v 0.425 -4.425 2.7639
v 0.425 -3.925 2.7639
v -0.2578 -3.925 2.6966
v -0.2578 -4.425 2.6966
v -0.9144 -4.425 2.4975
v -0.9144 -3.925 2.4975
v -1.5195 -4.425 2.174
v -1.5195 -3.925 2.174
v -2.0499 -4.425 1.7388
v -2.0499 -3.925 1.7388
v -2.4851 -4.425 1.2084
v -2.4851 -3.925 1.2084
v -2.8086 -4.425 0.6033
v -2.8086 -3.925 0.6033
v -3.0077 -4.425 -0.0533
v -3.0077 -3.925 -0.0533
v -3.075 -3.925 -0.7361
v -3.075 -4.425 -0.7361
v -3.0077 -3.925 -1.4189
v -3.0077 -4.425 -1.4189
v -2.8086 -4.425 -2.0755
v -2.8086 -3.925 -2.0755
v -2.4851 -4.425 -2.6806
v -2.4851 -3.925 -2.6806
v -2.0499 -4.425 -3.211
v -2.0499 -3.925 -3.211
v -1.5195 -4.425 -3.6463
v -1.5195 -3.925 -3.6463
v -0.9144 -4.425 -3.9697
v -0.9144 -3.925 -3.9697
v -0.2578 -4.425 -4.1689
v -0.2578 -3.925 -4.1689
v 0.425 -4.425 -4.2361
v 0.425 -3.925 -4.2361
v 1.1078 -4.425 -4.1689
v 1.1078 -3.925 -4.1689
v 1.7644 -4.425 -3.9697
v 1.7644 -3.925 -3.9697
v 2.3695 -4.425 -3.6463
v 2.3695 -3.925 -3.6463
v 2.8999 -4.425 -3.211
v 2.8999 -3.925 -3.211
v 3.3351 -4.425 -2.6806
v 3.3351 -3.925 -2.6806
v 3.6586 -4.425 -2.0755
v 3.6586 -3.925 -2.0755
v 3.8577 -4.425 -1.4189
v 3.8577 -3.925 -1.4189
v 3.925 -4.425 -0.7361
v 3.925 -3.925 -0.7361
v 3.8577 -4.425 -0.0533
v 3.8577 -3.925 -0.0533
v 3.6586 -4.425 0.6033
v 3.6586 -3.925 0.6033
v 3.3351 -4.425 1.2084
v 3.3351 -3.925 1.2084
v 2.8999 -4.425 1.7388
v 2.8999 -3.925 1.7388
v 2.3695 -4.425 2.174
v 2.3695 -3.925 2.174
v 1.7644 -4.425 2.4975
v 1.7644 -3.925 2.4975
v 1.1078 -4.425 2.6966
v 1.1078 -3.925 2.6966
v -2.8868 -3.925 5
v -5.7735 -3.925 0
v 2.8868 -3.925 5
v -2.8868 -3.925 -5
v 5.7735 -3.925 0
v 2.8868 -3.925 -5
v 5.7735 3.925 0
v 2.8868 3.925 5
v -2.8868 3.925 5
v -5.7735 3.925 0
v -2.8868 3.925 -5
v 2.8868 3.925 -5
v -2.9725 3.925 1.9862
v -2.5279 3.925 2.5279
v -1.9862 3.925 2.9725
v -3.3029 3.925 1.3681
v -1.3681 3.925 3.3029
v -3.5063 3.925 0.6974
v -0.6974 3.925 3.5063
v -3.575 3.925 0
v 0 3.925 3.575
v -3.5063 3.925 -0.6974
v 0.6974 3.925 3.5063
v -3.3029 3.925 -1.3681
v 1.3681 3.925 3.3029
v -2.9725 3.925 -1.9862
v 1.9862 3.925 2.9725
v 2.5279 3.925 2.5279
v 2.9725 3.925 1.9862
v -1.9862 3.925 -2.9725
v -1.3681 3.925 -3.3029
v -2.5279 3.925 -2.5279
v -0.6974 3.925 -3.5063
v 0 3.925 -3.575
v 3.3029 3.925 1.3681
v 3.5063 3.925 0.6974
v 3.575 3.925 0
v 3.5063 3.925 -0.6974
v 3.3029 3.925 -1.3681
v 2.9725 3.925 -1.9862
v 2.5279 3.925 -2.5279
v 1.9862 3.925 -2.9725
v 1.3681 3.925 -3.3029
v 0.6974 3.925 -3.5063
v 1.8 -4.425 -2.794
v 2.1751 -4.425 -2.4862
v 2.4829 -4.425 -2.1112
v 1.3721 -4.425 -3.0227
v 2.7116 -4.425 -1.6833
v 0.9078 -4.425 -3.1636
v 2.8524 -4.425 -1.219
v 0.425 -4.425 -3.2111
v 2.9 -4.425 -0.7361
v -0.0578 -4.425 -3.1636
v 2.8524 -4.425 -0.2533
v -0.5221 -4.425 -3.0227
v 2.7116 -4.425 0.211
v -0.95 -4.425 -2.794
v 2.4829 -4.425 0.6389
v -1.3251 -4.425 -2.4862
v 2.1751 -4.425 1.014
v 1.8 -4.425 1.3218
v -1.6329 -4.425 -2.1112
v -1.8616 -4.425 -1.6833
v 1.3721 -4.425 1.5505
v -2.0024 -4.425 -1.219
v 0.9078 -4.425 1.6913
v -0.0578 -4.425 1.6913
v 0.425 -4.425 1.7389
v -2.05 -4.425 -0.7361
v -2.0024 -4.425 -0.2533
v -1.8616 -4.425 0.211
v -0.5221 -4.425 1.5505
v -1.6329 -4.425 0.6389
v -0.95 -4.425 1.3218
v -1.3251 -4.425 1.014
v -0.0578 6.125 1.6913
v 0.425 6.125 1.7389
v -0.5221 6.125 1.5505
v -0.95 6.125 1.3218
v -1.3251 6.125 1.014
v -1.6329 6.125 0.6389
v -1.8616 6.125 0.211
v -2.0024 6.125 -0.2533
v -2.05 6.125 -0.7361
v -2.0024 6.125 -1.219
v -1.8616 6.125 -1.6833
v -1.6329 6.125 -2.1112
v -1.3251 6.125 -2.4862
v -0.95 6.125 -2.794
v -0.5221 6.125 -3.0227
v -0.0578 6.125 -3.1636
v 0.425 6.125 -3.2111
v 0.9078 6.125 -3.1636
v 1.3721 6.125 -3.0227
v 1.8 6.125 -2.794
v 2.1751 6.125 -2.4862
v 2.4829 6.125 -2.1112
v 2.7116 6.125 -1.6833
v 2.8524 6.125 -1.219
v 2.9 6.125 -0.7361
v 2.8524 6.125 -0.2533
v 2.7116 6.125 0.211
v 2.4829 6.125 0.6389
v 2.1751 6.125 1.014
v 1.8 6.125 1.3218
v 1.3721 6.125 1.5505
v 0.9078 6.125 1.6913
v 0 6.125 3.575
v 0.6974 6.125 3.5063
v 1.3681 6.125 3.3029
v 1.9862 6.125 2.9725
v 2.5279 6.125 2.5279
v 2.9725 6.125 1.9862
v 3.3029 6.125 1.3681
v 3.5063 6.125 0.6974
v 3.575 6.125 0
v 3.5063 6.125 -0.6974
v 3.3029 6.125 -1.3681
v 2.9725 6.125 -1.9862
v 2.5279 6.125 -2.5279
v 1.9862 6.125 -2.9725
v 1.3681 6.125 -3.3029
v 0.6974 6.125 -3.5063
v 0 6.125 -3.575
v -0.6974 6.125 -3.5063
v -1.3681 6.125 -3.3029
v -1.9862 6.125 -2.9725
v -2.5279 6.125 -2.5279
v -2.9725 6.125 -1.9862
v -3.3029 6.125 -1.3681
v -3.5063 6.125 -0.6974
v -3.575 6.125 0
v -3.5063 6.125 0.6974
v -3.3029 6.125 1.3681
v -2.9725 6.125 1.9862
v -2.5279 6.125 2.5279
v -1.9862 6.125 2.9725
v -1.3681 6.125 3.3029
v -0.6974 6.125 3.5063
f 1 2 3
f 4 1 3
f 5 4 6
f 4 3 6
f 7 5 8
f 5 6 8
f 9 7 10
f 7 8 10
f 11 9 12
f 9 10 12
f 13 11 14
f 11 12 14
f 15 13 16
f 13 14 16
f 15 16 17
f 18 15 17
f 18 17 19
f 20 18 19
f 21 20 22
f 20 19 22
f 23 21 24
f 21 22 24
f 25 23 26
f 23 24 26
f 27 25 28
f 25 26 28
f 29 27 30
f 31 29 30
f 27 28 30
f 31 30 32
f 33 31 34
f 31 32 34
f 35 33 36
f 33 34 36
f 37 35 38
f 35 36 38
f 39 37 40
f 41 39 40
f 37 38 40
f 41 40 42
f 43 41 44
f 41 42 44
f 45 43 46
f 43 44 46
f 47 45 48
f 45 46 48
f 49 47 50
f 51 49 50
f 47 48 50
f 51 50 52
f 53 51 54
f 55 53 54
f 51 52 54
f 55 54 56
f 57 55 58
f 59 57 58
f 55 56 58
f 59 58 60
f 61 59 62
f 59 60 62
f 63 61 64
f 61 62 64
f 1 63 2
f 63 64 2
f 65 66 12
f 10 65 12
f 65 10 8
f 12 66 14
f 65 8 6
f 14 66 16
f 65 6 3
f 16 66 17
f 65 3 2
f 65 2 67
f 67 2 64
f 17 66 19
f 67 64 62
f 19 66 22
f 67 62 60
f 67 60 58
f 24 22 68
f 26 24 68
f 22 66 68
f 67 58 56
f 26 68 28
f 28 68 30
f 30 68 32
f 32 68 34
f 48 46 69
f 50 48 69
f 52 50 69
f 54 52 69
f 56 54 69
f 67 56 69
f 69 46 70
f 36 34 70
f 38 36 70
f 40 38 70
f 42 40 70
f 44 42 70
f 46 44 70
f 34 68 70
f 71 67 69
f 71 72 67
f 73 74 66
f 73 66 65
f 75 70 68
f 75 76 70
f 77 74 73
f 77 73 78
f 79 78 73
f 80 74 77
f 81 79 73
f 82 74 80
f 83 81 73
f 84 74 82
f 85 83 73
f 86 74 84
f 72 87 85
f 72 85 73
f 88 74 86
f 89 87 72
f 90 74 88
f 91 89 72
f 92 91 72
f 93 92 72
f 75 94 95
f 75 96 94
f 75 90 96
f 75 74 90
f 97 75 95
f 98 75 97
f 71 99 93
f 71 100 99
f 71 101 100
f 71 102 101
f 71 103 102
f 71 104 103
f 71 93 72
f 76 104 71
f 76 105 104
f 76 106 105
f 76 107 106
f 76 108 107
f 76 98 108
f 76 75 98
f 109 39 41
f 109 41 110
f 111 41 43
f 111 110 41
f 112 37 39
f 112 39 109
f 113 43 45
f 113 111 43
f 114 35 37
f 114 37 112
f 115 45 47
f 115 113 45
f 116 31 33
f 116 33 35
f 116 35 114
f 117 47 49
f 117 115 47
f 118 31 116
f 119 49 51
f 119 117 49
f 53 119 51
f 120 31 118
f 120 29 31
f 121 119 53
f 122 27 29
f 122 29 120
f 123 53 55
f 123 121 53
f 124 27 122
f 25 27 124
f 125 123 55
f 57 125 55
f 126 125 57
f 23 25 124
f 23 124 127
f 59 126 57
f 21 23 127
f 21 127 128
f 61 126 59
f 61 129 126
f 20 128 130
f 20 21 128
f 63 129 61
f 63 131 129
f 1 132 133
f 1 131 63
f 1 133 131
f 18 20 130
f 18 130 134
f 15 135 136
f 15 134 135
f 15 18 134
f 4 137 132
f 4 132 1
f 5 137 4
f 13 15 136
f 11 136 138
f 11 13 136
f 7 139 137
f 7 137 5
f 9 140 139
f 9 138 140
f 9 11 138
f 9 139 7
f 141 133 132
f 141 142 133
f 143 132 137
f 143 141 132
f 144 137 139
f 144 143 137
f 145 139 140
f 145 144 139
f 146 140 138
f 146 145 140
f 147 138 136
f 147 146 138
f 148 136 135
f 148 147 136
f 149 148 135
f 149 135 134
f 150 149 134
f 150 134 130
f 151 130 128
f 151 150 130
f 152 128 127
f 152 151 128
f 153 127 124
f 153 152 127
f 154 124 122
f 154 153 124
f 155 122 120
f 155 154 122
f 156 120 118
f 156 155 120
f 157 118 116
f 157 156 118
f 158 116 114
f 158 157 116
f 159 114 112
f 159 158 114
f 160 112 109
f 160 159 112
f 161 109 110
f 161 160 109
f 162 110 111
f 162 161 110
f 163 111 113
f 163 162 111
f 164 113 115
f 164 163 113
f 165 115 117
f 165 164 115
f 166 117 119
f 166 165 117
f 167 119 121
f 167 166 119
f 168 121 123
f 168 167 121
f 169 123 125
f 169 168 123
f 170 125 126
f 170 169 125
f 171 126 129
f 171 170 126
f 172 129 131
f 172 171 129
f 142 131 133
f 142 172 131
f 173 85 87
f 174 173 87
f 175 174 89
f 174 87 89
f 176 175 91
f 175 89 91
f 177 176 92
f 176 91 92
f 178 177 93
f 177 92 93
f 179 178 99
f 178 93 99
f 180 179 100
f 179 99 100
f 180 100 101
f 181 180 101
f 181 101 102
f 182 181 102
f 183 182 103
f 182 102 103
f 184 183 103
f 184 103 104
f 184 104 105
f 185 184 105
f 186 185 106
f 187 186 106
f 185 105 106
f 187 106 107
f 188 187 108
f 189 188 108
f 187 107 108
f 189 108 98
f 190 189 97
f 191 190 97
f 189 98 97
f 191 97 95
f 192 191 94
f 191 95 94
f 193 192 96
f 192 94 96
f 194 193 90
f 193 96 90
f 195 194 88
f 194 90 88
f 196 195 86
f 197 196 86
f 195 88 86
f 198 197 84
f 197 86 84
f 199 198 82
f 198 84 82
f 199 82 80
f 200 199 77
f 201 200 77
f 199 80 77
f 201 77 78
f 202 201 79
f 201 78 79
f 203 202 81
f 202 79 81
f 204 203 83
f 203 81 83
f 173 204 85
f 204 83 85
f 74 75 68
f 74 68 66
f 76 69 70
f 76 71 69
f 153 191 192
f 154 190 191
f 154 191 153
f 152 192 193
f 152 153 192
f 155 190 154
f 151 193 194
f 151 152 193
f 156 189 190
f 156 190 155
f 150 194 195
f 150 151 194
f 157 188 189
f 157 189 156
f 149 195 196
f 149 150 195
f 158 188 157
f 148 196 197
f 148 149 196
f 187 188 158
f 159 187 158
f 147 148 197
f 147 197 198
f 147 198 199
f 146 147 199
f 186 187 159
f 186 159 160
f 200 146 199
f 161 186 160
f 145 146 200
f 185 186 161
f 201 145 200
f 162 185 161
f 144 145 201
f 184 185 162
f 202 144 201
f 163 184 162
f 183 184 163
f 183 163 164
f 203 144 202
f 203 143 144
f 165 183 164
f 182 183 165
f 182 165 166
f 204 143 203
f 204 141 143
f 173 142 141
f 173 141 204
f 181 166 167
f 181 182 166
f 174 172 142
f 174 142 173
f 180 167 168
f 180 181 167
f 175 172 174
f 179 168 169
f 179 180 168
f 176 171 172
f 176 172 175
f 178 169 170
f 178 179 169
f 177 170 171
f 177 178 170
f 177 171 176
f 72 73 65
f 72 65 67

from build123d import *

# Parameters (mm, degrees)
BOSS_EXTRUDE1_DEPTH = 3.925
SKETCH2_R           = 3.575
BOSS_EXTRUDE2_DEPTH = 2.2
SKETCH3_R           = 2.475
CUT_EXTRUDE1_DEPTH  = 13.622829846
SKETCH4_R           = 3.5
SKETCH4_R_2         = 2.475
BOSS_EXTRUDE3_DEPTH = 0.5


with BuildPart() as part:
    # Sketch1 → Boss-Extrude1 (new, symmetric)
    with BuildSketch(Plane(origin=(0, 0, 0), x_dir=(1, 0, 0), z_dir=(0, 1, 0))):
        Polygon((2.886751346, 5), (-2.886751346, 5), (-5.773502692, 0), (-2.886751346, -5), (2.886751346, -5), (5.773502692, 0), align=None)
    extrude(amount=BOSS_EXTRUDE1_DEPTH, both=True)

    # Sketch2 → Boss-Extrude2 (add)
    with BuildSketch(Plane(origin=(0, 3.925, 0), x_dir=(1, 0, 0), z_dir=(0, 1, 0))):
        with Locations(Location((0, 0, 0), (0, 0, 270))):
            Circle(SKETCH2_R)
    extrude(amount=BOSS_EXTRUDE2_DEPTH)

    # Sketch3 → Cut-Extrude1 (cut, through all)
    with BuildSketch(Plane(origin=(0, 6.125, 0), x_dir=(1, 0, 0), z_dir=(0, 1, 0))):
        with Locations(Location((0.425, 0.736121593, 0), (0, 0, 270))):
            Circle(SKETCH3_R)
    extrude(amount=-CUT_EXTRUDE1_DEPTH, mode=Mode.SUBTRACT)

    # Sketch4 → Boss-Extrude3 (add)
    with BuildSketch(Plane.XZ.offset(3.925)):
        with Locations(Location((0.425, -0.736121593, 0), (0, 0, 90))):
            Circle(SKETCH4_R)
        with Locations(Location((0.425, -0.736121593, 0), (0, 0, 90))):
            Circle(SKETCH4_R_2, mode=Mode.SUBTRACT)
    extrude(amount=BOSS_EXTRUDE3_DEPTH)


solid = part.part
